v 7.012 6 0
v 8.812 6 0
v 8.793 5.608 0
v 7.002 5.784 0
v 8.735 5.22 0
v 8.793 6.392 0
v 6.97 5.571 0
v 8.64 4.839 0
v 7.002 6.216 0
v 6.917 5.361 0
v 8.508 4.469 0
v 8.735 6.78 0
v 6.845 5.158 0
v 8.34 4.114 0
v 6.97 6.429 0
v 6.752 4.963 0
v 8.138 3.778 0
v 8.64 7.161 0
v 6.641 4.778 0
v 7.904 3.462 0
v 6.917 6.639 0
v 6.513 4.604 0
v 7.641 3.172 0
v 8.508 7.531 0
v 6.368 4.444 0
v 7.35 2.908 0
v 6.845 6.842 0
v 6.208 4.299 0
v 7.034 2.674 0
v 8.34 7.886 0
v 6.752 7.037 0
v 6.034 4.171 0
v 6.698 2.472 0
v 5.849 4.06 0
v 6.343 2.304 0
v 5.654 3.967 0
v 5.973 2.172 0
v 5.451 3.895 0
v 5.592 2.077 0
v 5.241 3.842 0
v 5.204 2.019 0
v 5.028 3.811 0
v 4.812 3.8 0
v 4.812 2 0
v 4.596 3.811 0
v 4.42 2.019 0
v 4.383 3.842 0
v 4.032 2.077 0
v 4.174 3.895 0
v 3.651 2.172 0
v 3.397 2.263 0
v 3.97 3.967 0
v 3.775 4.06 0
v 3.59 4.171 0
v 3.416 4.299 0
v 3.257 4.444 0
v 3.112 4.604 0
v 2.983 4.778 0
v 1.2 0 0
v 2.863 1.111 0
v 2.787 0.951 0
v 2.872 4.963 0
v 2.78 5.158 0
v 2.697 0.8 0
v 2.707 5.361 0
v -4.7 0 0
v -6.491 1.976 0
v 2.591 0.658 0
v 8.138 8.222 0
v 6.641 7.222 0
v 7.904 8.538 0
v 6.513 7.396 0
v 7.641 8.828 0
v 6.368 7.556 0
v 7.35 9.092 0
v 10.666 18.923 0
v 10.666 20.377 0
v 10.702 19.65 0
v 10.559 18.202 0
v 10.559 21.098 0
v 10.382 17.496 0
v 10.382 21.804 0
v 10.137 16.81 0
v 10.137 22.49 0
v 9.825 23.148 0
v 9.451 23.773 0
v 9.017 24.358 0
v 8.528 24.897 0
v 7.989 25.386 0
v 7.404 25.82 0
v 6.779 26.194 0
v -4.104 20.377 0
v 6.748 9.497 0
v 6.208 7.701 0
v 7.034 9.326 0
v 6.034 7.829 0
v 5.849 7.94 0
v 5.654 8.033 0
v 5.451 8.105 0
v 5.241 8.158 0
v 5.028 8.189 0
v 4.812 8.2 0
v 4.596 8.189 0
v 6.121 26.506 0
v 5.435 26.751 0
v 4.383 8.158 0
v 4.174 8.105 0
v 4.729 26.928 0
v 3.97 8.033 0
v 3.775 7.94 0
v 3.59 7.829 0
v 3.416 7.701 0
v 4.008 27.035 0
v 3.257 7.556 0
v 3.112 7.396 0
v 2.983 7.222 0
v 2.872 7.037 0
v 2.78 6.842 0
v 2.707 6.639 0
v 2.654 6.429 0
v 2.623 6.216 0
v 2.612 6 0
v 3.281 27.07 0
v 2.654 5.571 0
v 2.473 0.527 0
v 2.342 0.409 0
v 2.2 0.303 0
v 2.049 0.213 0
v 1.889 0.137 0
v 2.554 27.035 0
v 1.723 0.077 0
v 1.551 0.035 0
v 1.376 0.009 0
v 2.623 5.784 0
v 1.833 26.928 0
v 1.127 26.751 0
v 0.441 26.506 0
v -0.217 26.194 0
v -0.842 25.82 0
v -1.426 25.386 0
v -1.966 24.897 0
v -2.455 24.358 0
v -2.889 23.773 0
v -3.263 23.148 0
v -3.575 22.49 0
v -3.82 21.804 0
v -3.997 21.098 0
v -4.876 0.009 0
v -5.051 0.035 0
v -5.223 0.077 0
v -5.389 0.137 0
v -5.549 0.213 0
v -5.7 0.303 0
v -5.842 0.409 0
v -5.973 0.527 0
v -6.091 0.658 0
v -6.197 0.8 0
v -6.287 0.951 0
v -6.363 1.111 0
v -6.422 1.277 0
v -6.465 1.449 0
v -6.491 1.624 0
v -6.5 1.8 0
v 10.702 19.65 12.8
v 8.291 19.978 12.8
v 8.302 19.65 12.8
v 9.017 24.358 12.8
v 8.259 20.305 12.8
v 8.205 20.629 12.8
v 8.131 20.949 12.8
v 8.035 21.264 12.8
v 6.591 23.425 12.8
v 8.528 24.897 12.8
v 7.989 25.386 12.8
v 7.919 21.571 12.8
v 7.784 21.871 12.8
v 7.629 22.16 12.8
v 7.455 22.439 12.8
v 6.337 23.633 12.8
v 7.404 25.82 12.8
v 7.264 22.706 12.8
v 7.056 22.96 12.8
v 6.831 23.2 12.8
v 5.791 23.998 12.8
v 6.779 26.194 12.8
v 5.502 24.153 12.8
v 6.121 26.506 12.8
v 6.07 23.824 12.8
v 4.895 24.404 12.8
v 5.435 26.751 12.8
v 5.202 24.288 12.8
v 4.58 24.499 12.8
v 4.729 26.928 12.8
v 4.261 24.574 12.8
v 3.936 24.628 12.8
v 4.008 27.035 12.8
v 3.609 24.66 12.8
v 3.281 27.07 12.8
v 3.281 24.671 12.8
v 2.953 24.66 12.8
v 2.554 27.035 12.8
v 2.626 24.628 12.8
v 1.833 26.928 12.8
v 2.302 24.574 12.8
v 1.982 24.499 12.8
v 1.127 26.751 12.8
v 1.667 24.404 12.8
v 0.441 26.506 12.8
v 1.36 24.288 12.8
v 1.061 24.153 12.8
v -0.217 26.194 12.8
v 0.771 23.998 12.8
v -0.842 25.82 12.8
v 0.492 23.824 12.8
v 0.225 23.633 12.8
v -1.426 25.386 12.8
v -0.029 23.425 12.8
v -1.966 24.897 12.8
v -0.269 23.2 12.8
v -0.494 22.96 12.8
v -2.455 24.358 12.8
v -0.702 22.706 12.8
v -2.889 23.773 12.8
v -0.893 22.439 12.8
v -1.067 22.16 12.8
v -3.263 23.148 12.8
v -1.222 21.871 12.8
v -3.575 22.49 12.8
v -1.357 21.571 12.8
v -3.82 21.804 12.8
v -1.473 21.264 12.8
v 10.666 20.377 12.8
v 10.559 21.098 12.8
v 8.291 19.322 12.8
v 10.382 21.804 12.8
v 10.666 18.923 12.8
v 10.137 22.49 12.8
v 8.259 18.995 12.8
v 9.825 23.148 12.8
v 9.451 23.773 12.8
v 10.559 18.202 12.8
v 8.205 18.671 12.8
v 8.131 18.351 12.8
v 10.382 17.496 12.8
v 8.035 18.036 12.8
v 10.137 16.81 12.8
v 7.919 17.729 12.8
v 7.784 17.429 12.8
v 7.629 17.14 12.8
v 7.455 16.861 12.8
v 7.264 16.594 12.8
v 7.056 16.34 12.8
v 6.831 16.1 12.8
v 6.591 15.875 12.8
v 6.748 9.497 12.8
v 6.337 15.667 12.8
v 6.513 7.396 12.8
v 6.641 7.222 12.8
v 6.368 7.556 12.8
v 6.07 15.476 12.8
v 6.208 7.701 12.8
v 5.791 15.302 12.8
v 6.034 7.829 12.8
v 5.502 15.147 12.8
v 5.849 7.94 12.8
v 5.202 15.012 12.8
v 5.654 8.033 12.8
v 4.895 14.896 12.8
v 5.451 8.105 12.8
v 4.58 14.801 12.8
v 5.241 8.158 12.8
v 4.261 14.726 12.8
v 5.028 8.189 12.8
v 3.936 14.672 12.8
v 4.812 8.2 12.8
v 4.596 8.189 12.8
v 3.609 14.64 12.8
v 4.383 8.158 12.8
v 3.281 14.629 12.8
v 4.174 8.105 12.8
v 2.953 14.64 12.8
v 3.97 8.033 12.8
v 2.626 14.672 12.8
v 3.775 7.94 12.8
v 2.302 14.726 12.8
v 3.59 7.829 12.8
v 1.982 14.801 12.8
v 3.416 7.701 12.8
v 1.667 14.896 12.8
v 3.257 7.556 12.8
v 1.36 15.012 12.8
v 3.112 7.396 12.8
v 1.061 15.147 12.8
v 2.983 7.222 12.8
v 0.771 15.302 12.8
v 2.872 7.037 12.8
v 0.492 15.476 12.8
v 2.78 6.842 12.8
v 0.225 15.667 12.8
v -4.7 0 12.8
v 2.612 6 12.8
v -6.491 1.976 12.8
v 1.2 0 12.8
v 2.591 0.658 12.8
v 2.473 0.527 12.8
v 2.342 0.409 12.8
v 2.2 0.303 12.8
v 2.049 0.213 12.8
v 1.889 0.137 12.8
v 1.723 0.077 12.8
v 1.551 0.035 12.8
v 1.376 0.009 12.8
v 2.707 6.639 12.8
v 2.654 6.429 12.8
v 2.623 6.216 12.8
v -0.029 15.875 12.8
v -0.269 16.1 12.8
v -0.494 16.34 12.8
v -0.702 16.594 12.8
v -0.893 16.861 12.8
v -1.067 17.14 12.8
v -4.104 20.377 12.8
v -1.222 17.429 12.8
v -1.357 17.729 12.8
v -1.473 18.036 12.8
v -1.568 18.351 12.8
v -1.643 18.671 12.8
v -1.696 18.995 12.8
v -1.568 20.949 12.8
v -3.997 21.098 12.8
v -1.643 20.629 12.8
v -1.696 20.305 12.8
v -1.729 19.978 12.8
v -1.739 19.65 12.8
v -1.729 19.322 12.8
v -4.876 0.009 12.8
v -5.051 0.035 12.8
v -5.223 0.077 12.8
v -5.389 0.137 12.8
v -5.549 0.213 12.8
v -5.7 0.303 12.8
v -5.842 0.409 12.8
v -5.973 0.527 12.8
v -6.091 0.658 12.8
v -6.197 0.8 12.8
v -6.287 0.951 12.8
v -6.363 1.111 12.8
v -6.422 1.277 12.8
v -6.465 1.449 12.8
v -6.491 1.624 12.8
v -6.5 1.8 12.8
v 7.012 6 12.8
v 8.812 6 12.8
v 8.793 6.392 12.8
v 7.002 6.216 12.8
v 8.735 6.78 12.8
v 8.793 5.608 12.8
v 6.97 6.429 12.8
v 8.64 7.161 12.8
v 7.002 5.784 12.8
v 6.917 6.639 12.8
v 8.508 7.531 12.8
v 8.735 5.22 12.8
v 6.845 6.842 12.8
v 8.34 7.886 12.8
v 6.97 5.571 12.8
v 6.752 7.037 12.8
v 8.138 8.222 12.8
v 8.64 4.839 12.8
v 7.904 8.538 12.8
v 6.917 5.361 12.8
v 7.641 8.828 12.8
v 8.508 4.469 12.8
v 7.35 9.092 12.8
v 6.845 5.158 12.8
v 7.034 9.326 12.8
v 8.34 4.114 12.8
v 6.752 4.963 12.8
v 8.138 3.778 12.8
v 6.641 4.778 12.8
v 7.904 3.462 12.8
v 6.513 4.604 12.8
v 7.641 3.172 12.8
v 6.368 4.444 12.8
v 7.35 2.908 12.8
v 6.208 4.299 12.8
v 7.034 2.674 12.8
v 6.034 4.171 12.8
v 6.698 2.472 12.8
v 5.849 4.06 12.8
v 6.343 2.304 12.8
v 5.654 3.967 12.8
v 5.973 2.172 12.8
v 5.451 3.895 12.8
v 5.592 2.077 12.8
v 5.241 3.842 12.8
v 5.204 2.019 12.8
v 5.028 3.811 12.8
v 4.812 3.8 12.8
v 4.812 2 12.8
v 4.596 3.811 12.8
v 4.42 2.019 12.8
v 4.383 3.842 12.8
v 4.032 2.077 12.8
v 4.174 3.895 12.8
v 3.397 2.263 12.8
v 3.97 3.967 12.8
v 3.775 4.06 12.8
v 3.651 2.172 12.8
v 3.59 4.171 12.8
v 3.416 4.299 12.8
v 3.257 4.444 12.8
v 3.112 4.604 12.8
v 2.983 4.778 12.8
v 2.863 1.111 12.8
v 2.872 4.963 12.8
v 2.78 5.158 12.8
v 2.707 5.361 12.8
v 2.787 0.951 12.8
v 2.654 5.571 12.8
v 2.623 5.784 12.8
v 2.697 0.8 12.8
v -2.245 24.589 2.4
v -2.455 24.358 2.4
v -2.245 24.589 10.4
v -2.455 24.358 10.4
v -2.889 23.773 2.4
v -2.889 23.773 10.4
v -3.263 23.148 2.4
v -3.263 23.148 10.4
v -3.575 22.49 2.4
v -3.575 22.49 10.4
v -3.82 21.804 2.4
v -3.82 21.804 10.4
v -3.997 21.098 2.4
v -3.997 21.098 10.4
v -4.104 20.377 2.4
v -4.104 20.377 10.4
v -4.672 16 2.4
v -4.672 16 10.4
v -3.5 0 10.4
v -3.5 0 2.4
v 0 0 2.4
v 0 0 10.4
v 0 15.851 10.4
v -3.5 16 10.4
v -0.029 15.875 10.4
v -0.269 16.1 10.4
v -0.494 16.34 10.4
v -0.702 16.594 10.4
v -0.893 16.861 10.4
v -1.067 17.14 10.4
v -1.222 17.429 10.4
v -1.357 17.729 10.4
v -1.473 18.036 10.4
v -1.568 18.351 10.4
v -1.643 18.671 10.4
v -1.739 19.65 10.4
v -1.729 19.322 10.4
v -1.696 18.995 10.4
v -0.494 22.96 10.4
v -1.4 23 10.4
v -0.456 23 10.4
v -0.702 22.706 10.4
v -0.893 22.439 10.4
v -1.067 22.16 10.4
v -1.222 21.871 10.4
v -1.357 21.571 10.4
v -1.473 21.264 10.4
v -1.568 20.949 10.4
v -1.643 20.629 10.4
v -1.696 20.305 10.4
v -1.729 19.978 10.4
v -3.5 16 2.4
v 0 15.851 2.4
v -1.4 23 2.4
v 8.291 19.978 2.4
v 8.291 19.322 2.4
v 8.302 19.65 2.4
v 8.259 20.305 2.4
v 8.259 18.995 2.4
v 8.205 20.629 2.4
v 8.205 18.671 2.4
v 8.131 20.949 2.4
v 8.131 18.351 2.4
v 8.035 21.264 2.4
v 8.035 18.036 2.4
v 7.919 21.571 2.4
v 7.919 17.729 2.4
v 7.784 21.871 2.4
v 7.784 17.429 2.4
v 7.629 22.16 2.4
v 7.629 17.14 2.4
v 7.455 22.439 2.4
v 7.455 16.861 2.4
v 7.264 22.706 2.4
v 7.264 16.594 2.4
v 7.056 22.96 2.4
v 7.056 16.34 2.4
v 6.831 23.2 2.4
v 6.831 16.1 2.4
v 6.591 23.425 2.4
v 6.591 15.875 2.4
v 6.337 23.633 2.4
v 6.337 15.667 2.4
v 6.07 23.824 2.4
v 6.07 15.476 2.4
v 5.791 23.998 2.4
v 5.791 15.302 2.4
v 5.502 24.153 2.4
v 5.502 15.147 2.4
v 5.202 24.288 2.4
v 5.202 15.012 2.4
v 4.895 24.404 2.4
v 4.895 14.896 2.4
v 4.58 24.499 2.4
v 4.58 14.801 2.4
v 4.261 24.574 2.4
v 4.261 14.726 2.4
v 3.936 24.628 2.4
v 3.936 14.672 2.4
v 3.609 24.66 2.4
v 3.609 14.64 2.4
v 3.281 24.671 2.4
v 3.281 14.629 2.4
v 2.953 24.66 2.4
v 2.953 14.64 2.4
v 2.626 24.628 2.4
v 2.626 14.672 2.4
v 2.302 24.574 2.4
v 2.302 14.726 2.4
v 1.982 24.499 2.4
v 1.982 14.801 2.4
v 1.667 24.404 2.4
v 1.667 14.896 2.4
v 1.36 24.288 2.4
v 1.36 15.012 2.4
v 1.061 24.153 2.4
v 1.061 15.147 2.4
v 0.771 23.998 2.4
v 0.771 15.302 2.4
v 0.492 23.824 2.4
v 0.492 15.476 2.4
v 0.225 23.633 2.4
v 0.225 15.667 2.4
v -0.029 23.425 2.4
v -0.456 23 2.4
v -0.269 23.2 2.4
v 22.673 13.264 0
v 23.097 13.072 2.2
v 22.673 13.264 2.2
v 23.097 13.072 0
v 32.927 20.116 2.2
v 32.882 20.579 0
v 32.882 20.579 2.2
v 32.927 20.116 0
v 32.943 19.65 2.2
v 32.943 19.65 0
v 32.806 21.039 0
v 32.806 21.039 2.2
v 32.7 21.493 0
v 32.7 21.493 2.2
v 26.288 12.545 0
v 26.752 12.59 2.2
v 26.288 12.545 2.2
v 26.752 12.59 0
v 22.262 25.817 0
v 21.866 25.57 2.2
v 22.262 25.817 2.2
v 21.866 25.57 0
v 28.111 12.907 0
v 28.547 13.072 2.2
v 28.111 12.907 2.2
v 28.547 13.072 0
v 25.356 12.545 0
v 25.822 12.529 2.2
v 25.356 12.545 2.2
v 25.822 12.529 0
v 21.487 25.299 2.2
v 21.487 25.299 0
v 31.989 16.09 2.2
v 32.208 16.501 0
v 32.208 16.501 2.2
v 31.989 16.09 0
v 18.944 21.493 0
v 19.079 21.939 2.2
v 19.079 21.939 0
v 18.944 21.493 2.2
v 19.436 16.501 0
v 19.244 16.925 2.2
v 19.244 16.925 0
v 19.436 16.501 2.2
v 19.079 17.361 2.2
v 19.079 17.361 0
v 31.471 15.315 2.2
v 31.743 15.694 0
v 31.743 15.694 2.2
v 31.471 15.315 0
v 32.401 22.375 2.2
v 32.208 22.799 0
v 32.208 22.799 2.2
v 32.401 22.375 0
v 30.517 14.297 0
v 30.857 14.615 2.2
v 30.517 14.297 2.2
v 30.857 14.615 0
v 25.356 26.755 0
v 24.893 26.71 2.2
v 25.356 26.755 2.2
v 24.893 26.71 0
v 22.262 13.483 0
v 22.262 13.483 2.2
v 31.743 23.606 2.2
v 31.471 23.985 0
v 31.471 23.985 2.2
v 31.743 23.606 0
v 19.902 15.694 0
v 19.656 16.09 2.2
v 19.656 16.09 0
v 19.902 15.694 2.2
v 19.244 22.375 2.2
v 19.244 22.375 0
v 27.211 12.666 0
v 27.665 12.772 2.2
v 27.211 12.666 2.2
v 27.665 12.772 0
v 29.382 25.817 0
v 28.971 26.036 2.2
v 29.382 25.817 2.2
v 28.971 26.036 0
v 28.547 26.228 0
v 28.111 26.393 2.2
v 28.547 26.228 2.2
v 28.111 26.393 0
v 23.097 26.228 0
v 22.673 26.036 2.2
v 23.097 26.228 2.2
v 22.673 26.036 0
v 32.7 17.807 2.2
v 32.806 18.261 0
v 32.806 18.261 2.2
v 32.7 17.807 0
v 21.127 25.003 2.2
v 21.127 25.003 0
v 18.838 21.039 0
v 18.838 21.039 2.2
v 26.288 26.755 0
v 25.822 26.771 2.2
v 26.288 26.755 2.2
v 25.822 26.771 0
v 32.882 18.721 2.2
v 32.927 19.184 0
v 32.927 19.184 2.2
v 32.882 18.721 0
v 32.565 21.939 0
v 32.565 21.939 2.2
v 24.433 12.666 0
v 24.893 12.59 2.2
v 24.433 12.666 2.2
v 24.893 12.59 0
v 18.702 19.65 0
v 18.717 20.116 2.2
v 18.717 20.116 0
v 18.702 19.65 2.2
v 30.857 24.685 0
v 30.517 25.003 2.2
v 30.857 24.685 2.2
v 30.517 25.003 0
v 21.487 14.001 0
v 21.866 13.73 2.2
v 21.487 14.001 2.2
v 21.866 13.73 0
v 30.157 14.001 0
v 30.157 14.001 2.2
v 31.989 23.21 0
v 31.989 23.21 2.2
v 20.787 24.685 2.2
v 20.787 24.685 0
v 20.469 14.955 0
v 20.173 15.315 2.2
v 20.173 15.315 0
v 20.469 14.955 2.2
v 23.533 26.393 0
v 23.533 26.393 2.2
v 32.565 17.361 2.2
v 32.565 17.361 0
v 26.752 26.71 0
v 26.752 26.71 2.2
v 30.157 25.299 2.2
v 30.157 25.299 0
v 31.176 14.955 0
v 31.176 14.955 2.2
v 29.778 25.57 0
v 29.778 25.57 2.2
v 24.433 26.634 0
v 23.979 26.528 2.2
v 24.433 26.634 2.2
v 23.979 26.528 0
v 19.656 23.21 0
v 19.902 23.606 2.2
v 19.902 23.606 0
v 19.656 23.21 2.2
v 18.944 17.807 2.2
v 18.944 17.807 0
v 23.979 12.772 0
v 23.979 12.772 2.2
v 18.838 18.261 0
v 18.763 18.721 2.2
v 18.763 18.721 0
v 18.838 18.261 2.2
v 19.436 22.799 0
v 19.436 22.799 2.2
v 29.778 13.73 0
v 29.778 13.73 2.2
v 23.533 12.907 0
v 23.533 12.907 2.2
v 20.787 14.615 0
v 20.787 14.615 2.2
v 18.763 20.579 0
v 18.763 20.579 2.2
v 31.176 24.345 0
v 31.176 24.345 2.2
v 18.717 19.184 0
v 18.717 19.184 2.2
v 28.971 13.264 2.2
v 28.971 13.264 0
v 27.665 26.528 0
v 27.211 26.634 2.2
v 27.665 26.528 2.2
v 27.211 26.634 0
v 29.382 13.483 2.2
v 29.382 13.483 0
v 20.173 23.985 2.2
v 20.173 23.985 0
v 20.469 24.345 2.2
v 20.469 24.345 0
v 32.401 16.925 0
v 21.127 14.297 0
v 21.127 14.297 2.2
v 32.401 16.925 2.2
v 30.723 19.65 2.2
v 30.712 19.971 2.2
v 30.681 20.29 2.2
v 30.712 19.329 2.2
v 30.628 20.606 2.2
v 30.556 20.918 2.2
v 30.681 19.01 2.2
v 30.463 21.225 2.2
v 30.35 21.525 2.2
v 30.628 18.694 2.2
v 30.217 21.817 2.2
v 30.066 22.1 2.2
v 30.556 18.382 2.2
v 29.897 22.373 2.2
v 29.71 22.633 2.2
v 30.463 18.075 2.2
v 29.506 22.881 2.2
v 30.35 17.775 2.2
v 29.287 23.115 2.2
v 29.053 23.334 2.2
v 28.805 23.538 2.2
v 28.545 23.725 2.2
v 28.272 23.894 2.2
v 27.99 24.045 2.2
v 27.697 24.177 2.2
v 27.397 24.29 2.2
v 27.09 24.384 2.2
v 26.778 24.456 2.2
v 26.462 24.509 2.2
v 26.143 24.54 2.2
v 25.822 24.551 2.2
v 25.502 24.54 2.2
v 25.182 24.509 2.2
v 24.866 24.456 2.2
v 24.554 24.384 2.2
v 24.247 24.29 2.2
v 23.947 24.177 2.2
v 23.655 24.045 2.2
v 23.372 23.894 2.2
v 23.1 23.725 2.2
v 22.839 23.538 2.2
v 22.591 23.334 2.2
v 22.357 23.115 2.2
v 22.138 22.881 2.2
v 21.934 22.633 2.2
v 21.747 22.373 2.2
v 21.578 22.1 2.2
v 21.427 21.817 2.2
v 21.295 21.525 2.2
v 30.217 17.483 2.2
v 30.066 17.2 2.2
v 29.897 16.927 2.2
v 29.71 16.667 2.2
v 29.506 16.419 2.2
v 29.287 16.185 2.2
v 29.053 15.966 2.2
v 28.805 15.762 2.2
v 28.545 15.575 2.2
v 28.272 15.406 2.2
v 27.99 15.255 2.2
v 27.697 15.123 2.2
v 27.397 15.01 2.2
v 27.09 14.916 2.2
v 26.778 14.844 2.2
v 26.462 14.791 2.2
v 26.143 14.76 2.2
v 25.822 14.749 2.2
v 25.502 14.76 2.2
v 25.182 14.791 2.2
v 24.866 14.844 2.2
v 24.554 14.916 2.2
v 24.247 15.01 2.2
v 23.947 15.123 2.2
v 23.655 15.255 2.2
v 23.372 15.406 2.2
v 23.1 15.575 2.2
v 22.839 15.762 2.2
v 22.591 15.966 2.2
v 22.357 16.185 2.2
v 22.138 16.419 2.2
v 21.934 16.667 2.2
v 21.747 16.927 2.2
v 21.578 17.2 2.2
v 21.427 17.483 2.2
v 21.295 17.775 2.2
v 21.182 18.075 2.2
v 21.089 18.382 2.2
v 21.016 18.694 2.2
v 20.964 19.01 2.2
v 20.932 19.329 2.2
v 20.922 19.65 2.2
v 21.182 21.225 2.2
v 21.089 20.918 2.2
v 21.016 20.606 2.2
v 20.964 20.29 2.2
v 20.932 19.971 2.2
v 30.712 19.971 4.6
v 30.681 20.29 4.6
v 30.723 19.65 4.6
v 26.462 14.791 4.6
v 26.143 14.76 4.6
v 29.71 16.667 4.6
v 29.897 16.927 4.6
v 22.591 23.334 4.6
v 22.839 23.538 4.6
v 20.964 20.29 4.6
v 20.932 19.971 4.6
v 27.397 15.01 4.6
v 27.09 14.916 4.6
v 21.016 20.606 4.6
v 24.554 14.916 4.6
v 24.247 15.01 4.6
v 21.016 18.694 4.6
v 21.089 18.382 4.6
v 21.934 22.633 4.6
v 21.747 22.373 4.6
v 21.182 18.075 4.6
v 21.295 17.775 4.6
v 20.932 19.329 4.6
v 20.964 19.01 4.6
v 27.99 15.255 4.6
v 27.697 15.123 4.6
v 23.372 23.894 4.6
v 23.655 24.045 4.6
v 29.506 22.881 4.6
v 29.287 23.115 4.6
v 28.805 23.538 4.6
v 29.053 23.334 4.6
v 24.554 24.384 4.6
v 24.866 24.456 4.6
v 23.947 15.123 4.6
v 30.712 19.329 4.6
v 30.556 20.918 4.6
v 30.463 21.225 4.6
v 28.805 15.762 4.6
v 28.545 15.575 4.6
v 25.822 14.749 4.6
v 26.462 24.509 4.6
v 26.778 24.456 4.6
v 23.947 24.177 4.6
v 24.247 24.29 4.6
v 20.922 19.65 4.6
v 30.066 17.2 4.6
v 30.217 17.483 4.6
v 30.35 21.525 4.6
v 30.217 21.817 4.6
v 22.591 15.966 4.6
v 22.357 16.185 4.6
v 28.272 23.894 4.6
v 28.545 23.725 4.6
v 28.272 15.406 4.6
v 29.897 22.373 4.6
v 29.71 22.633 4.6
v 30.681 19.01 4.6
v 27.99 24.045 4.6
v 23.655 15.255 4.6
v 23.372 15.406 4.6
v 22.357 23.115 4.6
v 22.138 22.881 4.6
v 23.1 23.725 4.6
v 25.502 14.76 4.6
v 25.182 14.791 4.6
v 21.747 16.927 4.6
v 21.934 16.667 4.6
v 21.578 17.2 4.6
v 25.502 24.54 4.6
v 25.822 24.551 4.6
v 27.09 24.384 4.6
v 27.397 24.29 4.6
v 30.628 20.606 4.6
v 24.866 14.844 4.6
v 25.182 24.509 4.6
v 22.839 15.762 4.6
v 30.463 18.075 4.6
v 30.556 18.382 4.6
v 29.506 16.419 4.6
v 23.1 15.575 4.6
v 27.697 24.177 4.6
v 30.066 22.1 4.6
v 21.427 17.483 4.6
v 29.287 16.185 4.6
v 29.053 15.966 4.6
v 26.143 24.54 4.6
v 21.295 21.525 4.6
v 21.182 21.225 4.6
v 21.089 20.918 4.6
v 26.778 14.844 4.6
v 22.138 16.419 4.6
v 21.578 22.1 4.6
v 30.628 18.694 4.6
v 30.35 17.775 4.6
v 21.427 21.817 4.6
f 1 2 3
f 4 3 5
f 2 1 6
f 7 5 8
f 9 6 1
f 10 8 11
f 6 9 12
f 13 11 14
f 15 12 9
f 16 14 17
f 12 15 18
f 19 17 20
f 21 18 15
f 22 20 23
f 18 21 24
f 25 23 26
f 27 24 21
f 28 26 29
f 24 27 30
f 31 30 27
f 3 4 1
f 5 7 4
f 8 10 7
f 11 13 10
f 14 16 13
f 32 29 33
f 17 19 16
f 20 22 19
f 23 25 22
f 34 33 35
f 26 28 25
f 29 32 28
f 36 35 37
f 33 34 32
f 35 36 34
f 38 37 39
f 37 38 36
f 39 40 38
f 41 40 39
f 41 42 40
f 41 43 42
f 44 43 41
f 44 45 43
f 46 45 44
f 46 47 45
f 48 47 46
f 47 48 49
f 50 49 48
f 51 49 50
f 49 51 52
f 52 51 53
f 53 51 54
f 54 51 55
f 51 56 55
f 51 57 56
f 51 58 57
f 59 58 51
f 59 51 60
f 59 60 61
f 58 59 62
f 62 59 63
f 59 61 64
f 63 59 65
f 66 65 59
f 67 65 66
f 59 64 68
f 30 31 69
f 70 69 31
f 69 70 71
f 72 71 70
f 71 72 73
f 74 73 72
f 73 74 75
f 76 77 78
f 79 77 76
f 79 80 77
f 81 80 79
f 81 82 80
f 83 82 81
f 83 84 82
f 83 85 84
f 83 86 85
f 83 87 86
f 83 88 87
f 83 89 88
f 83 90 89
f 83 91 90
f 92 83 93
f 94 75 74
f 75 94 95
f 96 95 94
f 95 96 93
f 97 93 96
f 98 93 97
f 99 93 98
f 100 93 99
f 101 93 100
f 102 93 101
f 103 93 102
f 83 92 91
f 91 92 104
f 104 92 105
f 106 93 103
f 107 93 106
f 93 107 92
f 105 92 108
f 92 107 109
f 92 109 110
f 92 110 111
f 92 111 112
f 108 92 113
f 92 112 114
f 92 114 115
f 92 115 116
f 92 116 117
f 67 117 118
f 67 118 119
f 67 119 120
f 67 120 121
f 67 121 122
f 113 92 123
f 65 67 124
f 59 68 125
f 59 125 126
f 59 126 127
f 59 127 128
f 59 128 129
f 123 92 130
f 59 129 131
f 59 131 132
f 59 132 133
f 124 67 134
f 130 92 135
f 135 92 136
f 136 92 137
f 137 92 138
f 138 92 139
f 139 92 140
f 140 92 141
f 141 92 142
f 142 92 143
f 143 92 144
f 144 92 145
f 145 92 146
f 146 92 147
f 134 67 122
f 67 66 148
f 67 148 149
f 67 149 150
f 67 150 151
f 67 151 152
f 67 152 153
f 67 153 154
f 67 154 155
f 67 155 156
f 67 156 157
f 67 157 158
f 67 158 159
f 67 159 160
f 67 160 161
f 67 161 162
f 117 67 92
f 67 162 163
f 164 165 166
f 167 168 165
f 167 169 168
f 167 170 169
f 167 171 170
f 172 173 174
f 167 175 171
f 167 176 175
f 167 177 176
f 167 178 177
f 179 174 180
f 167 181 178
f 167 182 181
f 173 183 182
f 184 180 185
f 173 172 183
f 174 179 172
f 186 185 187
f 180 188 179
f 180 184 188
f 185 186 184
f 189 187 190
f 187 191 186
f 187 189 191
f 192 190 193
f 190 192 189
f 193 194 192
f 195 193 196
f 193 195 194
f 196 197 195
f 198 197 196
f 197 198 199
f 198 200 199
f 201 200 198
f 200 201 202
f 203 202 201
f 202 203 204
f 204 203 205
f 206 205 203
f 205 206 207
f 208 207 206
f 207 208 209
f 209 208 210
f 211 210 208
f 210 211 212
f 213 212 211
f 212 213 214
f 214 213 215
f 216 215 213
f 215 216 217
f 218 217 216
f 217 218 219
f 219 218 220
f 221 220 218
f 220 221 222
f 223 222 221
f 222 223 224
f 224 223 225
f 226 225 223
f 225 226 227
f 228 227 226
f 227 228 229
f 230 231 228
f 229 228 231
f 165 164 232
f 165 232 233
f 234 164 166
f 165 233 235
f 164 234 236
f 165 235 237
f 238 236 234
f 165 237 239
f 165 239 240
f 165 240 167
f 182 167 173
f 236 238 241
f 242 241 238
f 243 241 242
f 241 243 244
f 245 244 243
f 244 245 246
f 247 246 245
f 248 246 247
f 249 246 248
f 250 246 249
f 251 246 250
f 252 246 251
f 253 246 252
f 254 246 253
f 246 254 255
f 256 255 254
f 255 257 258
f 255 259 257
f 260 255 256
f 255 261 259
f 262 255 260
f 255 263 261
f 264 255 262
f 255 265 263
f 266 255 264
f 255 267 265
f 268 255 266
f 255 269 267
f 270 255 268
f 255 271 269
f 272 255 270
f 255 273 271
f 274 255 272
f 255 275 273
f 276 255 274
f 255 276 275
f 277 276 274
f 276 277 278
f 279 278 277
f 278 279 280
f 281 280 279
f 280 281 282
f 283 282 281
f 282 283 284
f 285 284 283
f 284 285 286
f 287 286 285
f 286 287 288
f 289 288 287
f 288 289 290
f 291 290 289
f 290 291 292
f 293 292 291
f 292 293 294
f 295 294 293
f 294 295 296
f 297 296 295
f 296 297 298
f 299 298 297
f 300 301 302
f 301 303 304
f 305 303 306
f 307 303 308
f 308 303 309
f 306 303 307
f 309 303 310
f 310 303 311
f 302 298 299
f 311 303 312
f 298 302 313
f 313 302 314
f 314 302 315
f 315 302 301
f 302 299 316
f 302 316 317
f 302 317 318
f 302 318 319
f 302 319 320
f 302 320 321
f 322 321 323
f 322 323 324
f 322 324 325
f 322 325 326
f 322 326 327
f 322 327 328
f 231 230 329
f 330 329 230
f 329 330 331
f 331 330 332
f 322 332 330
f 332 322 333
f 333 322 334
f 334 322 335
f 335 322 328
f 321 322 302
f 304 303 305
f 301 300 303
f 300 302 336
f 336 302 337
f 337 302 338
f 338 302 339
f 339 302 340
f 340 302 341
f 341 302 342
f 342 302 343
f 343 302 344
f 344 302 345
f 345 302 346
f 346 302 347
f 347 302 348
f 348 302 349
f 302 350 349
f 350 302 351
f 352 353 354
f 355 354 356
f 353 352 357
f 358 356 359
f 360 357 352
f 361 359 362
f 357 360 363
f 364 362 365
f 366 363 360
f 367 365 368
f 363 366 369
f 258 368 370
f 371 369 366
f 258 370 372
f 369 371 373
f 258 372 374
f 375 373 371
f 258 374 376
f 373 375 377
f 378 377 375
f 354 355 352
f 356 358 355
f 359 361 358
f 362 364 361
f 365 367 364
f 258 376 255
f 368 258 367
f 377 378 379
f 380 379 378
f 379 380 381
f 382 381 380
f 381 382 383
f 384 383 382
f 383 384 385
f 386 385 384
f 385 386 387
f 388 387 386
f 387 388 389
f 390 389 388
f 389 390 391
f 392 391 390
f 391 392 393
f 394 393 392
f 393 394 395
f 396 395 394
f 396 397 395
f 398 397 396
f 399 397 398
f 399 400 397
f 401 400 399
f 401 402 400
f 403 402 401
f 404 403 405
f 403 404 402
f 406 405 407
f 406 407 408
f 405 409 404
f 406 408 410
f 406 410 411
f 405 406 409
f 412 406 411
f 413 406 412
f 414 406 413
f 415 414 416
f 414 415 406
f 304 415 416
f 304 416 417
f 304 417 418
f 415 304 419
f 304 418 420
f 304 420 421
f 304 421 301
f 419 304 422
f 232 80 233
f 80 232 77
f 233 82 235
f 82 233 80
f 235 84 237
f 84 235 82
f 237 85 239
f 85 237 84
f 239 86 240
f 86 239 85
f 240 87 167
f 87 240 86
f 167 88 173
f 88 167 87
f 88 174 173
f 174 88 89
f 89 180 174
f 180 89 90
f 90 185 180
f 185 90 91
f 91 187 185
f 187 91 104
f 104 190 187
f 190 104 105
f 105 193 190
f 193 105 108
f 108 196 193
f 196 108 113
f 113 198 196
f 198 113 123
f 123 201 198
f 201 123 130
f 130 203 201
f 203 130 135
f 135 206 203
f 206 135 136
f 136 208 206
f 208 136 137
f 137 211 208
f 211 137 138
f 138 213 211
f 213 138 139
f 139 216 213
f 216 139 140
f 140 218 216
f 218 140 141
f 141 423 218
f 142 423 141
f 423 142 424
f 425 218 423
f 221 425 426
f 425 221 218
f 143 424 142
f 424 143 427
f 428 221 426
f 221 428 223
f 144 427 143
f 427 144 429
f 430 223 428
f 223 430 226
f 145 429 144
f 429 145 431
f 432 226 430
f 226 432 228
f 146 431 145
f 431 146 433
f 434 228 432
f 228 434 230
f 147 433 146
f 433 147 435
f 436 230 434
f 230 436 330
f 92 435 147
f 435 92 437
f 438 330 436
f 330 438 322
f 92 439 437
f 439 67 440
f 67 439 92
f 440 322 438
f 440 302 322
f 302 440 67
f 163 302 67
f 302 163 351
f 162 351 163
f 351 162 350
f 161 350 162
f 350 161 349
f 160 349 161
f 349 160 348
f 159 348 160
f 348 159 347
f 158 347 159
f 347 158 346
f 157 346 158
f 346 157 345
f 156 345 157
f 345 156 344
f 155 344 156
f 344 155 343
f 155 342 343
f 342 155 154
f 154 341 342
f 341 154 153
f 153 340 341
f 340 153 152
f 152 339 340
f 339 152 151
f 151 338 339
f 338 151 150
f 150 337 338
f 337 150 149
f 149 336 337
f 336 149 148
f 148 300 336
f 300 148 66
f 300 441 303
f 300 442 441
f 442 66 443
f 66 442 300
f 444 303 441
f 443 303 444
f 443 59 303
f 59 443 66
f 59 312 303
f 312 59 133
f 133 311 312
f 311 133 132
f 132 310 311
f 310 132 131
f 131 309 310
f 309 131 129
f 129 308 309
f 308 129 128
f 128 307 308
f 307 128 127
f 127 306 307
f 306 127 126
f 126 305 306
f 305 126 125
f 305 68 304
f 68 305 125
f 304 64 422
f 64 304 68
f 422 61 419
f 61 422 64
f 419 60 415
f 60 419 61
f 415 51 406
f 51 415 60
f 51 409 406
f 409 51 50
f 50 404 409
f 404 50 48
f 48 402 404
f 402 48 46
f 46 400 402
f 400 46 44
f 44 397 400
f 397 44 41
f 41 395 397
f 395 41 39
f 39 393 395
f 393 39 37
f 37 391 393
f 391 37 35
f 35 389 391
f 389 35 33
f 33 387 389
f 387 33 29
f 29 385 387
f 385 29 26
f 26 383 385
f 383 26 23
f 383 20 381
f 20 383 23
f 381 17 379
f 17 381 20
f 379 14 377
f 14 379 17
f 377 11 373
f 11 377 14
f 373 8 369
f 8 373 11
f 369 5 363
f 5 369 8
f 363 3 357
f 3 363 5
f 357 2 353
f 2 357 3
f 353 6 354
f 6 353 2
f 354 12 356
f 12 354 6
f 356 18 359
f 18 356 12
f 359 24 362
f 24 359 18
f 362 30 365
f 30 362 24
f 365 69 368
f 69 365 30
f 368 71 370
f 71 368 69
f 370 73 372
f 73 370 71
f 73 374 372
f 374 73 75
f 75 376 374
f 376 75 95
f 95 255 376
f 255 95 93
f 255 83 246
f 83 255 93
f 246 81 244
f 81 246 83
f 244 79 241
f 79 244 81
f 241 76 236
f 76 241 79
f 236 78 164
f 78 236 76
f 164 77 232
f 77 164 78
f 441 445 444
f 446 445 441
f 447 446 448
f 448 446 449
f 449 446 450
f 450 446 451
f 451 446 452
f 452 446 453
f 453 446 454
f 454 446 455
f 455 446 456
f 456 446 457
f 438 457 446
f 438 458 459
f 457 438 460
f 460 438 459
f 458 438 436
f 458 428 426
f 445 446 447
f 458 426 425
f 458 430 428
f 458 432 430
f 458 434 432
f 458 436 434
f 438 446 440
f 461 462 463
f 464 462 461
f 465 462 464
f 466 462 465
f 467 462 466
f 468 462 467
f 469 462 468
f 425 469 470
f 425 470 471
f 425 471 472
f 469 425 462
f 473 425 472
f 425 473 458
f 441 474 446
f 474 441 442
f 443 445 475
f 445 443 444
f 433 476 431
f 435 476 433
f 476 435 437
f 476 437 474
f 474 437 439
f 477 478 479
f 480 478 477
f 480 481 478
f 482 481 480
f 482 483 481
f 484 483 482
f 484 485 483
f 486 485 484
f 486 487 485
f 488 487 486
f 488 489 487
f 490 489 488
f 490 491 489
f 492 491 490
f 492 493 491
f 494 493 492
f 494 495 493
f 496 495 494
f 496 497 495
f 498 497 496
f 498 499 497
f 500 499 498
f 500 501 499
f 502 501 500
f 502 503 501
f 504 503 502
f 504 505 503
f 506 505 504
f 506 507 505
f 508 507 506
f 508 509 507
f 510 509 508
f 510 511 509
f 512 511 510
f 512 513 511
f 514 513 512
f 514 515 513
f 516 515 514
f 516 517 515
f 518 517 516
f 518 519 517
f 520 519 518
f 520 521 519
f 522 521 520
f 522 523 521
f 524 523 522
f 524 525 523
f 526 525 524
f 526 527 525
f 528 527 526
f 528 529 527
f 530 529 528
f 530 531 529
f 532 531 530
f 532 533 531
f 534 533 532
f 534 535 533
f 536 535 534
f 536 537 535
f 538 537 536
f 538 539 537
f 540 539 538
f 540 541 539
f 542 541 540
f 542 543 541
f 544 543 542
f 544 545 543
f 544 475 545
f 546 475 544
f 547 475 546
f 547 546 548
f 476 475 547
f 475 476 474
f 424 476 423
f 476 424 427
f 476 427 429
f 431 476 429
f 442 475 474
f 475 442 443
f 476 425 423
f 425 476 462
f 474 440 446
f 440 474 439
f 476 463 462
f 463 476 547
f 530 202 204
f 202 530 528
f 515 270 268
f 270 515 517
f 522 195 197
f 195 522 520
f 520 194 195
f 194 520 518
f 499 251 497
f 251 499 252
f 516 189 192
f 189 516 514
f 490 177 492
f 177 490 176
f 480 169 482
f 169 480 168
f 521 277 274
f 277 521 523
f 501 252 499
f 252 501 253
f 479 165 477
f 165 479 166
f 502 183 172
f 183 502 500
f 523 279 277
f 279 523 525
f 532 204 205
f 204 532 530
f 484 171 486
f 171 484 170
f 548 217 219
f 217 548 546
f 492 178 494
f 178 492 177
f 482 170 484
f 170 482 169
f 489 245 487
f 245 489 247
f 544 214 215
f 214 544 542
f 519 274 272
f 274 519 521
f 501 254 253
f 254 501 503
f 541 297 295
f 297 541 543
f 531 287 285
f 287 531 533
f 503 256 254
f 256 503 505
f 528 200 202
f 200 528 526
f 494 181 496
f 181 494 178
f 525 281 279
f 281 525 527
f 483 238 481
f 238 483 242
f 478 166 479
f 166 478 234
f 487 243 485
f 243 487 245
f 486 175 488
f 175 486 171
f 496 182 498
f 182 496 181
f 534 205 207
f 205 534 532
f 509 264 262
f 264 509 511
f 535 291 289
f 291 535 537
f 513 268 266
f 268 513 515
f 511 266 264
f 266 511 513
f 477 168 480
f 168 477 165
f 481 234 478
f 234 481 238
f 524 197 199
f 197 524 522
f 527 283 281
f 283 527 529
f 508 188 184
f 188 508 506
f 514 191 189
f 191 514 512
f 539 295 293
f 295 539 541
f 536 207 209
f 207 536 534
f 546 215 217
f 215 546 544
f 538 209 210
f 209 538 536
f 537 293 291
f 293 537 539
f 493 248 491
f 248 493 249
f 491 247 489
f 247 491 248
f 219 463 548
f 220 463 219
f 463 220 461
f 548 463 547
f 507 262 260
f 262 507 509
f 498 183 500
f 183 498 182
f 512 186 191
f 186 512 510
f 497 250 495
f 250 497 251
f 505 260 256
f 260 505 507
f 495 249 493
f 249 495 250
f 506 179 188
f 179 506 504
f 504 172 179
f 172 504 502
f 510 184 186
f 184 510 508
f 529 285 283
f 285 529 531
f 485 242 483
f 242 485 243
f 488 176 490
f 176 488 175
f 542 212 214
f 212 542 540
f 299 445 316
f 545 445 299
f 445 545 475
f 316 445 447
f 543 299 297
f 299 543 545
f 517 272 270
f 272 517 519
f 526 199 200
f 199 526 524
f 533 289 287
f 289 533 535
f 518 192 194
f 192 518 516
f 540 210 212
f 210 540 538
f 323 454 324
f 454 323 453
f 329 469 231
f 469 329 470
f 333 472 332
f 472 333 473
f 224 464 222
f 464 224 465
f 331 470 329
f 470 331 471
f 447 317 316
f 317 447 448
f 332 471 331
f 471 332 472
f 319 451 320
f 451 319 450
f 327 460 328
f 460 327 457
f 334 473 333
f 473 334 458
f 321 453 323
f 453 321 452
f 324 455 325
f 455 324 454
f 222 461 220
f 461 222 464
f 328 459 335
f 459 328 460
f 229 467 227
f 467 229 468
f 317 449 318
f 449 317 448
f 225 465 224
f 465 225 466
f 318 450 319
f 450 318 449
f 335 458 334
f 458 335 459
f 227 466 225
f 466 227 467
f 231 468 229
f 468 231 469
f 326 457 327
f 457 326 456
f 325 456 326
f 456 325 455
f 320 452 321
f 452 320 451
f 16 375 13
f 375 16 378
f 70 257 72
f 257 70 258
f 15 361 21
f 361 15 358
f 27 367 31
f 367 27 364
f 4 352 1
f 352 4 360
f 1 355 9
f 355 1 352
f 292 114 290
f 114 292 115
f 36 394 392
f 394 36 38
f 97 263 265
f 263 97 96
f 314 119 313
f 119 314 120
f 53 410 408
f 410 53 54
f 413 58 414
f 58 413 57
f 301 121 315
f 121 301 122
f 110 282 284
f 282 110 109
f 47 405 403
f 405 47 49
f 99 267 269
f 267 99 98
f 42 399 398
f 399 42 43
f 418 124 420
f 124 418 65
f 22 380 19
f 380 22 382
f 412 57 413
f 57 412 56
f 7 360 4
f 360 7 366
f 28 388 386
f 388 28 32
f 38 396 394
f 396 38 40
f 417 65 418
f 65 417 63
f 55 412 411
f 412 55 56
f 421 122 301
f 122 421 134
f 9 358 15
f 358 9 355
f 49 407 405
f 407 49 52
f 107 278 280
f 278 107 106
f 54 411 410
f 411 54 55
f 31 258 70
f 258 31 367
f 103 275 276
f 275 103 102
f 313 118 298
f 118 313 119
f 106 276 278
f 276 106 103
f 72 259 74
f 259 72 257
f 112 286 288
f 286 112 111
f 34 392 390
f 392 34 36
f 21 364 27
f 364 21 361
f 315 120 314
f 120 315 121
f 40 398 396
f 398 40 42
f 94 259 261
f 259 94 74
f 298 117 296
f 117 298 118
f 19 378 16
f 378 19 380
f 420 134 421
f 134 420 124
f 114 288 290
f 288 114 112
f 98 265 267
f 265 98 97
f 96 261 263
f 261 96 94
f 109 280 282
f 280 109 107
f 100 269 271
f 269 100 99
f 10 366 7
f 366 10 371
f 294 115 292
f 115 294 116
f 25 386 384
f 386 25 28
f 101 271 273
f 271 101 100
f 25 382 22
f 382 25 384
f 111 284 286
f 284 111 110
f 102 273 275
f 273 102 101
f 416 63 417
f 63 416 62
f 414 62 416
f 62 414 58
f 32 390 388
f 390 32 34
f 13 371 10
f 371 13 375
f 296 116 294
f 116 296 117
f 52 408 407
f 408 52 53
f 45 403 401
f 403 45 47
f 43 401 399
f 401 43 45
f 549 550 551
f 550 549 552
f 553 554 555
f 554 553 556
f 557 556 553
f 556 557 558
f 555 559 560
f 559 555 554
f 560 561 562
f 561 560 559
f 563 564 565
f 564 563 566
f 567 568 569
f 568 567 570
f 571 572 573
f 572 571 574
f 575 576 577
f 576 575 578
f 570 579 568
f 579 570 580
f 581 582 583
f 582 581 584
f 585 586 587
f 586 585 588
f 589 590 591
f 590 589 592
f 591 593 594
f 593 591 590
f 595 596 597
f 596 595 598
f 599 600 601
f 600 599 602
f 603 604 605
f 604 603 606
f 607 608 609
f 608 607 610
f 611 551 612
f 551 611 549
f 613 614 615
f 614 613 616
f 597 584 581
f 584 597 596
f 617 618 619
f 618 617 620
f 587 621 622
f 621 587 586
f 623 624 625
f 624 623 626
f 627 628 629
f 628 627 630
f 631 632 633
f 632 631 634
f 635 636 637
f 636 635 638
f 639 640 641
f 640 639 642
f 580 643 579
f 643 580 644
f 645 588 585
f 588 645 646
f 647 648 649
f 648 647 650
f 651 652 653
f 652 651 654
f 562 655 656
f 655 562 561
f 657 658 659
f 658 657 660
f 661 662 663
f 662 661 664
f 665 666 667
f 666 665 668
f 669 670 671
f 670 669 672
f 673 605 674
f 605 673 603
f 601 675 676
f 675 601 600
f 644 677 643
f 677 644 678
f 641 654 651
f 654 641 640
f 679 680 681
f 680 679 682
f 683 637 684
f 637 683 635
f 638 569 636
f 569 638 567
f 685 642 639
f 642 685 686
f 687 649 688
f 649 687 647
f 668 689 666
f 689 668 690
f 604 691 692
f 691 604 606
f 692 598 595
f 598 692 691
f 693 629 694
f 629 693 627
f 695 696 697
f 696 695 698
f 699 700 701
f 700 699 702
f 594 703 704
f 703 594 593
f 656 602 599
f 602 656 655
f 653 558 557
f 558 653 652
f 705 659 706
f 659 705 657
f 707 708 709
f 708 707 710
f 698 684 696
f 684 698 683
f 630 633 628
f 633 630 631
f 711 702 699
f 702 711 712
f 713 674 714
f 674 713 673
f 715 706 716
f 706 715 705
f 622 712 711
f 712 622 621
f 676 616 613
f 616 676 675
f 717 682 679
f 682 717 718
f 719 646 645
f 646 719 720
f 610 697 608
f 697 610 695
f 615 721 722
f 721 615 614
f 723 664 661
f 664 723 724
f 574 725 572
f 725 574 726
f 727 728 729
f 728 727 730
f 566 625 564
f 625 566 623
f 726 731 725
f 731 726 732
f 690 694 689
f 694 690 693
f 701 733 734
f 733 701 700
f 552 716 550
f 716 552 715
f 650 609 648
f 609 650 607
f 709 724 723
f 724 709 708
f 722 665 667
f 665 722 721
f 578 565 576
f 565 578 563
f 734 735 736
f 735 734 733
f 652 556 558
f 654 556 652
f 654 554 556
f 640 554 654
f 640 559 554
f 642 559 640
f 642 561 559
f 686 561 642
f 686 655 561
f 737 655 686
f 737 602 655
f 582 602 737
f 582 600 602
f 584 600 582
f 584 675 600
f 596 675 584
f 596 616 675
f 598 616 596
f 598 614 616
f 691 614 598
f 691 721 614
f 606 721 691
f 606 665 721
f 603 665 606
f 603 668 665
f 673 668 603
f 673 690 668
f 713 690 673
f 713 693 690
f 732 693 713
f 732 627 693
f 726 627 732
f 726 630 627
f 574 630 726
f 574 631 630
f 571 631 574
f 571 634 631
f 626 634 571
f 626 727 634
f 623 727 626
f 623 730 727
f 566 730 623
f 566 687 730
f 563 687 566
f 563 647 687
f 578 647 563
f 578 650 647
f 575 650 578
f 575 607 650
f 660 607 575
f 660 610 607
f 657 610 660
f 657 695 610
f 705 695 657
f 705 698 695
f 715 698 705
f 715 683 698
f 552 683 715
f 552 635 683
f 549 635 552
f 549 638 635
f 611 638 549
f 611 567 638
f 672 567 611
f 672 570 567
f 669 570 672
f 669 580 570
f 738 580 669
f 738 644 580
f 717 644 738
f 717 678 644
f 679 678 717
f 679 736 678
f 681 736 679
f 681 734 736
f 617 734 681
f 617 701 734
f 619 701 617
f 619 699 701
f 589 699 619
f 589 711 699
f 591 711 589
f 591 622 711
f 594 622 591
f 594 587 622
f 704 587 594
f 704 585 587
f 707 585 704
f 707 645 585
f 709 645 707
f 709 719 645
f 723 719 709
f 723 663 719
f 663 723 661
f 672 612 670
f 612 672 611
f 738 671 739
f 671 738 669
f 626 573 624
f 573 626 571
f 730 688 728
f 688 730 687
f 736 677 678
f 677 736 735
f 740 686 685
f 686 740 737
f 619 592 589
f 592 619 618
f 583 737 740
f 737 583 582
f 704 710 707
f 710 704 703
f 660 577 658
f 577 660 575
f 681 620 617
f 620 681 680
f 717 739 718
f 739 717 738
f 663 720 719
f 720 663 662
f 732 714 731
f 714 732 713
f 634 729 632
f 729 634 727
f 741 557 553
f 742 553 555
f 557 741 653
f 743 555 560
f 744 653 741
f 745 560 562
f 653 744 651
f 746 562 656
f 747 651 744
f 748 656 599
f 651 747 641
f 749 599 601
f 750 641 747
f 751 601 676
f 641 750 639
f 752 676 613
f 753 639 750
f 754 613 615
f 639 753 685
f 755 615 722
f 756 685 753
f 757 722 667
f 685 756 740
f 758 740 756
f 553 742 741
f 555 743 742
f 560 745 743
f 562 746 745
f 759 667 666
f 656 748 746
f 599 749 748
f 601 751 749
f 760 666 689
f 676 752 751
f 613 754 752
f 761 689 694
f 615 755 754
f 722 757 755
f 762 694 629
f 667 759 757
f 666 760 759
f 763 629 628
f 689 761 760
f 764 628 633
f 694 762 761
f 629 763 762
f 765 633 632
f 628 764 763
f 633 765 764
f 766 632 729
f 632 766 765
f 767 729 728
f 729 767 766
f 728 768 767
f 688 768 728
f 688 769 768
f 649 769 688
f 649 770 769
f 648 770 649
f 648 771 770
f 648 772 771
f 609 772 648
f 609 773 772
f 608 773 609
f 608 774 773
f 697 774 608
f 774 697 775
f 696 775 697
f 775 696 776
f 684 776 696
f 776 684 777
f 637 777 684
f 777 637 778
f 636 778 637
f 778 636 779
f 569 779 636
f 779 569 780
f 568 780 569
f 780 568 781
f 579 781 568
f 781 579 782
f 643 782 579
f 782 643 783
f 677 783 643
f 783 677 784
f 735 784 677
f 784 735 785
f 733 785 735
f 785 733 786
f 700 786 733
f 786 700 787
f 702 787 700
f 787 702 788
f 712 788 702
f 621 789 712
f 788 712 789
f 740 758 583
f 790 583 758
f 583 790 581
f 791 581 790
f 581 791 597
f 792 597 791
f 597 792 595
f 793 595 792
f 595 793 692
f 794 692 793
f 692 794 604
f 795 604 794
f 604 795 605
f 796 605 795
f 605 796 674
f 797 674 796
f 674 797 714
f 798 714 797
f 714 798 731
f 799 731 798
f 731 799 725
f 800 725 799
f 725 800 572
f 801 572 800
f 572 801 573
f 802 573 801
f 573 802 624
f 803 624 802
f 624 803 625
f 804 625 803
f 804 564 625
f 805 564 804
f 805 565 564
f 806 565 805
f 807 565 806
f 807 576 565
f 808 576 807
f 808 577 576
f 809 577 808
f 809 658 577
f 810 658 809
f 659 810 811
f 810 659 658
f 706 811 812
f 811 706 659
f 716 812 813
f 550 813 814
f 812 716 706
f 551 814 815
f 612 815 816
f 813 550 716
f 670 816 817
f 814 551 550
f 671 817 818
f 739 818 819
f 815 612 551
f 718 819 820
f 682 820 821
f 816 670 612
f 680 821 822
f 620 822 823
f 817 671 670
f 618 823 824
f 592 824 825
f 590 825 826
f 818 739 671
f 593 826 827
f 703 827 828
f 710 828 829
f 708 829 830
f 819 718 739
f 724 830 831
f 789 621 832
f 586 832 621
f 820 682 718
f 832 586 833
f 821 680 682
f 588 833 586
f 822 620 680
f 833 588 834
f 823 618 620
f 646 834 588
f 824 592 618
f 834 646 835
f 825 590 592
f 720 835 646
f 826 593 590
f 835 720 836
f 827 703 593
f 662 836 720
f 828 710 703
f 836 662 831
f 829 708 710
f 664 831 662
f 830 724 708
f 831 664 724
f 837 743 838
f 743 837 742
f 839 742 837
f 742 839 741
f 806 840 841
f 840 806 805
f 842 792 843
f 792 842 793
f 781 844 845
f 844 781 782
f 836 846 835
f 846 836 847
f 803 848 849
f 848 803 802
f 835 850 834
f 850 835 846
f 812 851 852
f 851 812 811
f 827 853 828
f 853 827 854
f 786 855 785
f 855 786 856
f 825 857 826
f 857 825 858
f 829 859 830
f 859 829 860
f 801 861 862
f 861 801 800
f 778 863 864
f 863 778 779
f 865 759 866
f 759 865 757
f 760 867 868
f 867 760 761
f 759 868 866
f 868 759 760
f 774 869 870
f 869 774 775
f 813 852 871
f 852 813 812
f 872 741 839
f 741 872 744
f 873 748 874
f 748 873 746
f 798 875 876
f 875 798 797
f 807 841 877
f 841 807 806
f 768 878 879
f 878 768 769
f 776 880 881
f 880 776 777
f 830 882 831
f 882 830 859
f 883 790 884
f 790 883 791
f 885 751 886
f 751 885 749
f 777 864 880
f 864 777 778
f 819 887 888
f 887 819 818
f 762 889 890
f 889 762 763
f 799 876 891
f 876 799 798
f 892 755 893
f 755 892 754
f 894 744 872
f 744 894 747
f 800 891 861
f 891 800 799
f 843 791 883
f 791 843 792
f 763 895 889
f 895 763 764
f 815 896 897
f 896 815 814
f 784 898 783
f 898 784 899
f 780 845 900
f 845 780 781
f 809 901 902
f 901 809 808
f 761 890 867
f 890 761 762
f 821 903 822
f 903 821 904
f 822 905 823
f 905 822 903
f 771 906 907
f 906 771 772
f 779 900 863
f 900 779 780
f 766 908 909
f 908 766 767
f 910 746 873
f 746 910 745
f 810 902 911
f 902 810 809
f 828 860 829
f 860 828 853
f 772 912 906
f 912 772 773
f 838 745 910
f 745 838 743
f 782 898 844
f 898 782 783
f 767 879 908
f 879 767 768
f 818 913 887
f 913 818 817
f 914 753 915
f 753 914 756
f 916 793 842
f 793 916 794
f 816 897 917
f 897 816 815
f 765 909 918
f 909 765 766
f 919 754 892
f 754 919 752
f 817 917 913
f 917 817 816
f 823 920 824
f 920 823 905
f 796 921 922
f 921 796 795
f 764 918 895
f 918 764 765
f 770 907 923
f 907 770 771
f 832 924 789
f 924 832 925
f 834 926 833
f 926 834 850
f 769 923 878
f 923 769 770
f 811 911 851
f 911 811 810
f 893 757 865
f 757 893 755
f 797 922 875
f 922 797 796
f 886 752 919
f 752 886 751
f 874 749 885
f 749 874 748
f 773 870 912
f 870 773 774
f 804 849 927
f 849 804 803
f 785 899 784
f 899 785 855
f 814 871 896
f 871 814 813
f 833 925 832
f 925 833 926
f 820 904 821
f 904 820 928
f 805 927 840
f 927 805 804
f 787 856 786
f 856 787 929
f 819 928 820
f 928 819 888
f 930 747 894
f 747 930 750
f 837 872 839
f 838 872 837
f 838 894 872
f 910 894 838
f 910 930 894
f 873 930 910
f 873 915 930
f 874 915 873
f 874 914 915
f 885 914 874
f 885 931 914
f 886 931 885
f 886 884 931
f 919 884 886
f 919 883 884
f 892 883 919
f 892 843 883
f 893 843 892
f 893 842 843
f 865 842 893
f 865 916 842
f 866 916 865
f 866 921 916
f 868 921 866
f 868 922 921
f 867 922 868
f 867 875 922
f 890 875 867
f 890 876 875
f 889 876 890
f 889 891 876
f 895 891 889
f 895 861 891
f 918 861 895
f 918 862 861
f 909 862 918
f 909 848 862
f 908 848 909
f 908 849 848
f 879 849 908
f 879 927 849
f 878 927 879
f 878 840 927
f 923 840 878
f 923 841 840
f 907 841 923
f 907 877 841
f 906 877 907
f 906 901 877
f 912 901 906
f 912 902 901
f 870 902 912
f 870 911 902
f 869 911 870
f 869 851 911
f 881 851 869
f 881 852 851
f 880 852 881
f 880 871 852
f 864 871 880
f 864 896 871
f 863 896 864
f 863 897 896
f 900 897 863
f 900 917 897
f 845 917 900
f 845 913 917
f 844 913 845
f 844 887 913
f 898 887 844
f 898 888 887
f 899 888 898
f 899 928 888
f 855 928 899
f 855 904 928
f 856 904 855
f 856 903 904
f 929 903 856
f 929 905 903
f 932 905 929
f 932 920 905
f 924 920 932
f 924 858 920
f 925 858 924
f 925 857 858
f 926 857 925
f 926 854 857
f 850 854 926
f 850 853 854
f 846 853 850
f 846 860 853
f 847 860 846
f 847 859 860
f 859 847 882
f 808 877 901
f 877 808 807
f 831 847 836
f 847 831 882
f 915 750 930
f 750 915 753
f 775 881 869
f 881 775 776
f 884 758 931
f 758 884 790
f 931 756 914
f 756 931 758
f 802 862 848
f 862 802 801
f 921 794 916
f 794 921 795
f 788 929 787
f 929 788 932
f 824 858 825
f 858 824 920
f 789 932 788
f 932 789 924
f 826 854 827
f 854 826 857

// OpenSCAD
// @name Helmholtz Whistle
// @description Pea-less referee-style whistle whose chamber is sized from the Helmholtz equation to hit a target frequency (default 2500 Hz). Two pieces: body plus glue-in side cap, with a lanyard ring.
// @tags whistle, acoustics, helmholtz, referee, parametric, two-piece
//
// PHYSICS - Helmholtz resonator:
//
//     f = (c / 2*pi) * sqrt( A / (V * Leff) )
//
//   c    = speed of sound, 343 m/s (343000 mm/s) at 20 C
//   A    = duct exit area = duct_w * duct_h                     [mm^2]
//   Leff = duct_len + 1.7 * r_eq   (flanged-end correction),
//          r_eq = sqrt(A/pi) = equivalent duct radius           [mm]
//   V    = resonant chamber volume                              [mm^3]
//
// This file INVERTS the formula to size the chamber from the target
// frequency:  V = c^2 * A / (4*pi^2 * f^2 * Leff).  The chamber is a
// cylinder lying ACROSS the body (axis = X), interior width equal to
// duct_w, so its diameter is  D = 2 * sqrt( V / (pi * duct_w) ).
//
// Defaults:  A = 28 mm^2, r_eq = 2.985 mm, Leff = 21.075 mm
//            -> V = 633.5 mm^3 -> chamber D = 10.04 mm -> f = 2500 Hz.
// The formula is a lumped-element model; the real note also depends on
// blowing pressure and the jet/labium interaction (expect a few percent).
//
// GEOMETRY (referee-whistle cross-section, all in the YZ plane):
//   - Mouthpiece duct: rectangular windway, floor at z=0, from the mouth
//     face (y=0) to the window (y=duct_len).
//   - Window + labium: an opening in the top from the duct exit to a
//     SHARP wedge edge (the labium) at height labium_h (~0.4*duct_h),
//     which splits the air jet.  The wedge top rises at labium_angle.
//   - Chamber: transverse cylinder tangent-crossing the duct floor plane
//     so the window opens straight into it (the "mouth" of the resonator).
//
// TWO PIECES - why: the chamber is a closed transverse cylinder.  Printed
// in one piece it would need either internal supports (impossible to
// remove, wrecks the resonance) or a long flat bridge across the chamber
// ceiling (saggy, leaky).  Instead the body prints lying on its side, so
// every cavity wall is vertical and support-free, and the chamber's open
// side is sealed by a flat cap: plug depth = wall thickness, so the plug
// face sits exactly flush with the interior wall and the chamber volume
// is preserved.  Glue the cap on (the 0.12 mm radial glue gap adds
// ~1.8% of V while the glue cures - within the model's accuracy).
//
// PRINT: no supports.  "all" mode is the print layout - body on its
// side, cap flange-down.  0.2 mm layers, 100% infill recommended (a
// stiff shell gives a cleaner tone).
//
// ASSEMBLY: drop of CA glue around the cap plug, press flush, wipe.
// Thread a lanyard through the ring under the mouthpiece.
//
// Modes: "all" = print layout (2 bodies); "body" / "cap" = single
// pieces; "cutaway" = body halved lengthwise, upright, showing the
// duct, window, labium wedge and chamber.

/* [Acoustics] */
// Target fundamental frequency (Hz)
target_hz = 2500; // [1800:100:3200]
// Speed of sound (m/s) - 343 at 20 C
speed_of_sound = 343; // [330:1:355]

/* [Duct] */
// Duct (windway) width across the whistle; also the chamber interior width (mm)
duct_w = 8; // [6:0.5:10]
// Duct height (mm)
duct_h = 3.5; // [2.5:0.25:4.5]
// Duct length, mouth face to window (mm)
duct_len = 16; // [12:1:22]

/* [Fipple] */
// Window length, duct exit to labium edge (mm)
win_len = 7; // [5:0.5:9]
// Labium edge height above the duct floor (mm) - ~40% of duct height
labium_h = 1.4; // [0.8:0.1:2.2]
// Labium wedge angle above horizontal (degrees)
labium_angle = 28; // [20:1:35]

/* [Build] */
// Wall thickness (mm)
wall = 2.4; // [2:0.2:3.2]
// Radial glue clearance, cap plug to chamber bore (mm)
cap_clearance = 0.12; // [0.05:0.01:0.25]

/* [Display] */
// What to show
_display_mode = "all"; // ["all", "body", "cap", "cutaway"]

/* [Advanced] */
// Resolution
$fn = 64;
// Chamber / cap facets (higher = truer chamber volume)
_fn_chamber = 96;

// ---- Helmholtz sizing (mm units; c in mm/s) --------------------------
_c = speed_of_sound * 1000;              // mm/s
_A = duct_w * duct_h;                    // duct exit area, mm^2
_r_eq = sqrt(_A / PI);                   // equivalent duct radius, mm
_Leff = duct_len + 1.7 * _r_eq;          // neck + end correction, mm
// Invert f = (c/2pi)*sqrt(A/(V*Leff))  ->  chamber volume, mm^3
_V_req = _c * _c * _A / (4 * PI * PI * target_hz * target_hz * _Leff);
// Chamber: cylinder along X, interior width duct_w -> diameter
_r_ch = sqrt(_V_req / (PI * duct_w));    // chamber interior radius
_f_check = _c / (2 * PI) * sqrt(_A / (_V_req * _Leff));

echo(str("Helmholtz sizing: A=", _A, " mm^2  r_eq=", _r_eq,
    " mm  Leff=", _Leff, " mm  V=", _V_req, " mm^3  chamber D=",
    2 * _r_ch, " mm  -> predicted f=", _f_check, " Hz"));
assert(abs(_f_check - target_hz) < 0.01 * target_hz,
    "internal error: inverted Helmholtz formula does not round-trip");

// ---- Derived geometry ------------------------------------------------
_w_in = duct_w;                          // interior width (X)
_w_out = _w_in + 2 * wall;               // exterior width (X)
_mouth_t = 3;                            // outer shell above/below duct at mouth
_r_m = 1.8;                              // mouthpiece profile corner radius
_y_edge = duct_len + win_len;            // labium edge Y
// Chamber crosses the duct-floor plane (z=0) so the window opens into it.
// Half-chord of that crossing = win_len/2 + 0.3 so both window-cutter
// bottom corners land strictly INSIDE the cavity (no tangent contacts).
_hc = win_len / 2 + 0.3;
assert(_r_ch > _hc + 0.15, str("Chamber radius ", _r_ch,
    " mm is too small for a ", win_len,
    " mm window: shorten win_len, enlarge the duct, or lower target_hz"));
_y_c = duct_len + win_len / 2 + 0.15;    // chamber center Y
_z_c = -sqrt(_r_ch * _r_ch - _hc * _hc); // chamber center Z (below floor)
_r_out = _r_ch + wall;                   // chamber outer radius
_z_sky = duct_h + _mouth_t + _r_ch + 10; // safely above any body surface
_lab_run = (_z_sky - labium_h) / tan(labium_angle);

// Lanyard ring: centered on the chord between the mouthpiece bottom
// point and the chamber bottom point (both on the body, so the chord is
// inside the convex hull => the ring is always welded to the body).
// The ring slides forward (toward the mouth) until its hole clears the
// chamber cavity by >= 1.2 mm of wall.
_ring_r = 4;
_ring_hole_r = 2.2;
_zb_mouth = -_mouth_t;                   // mouth-bottom point (y=_r_m)
_zb_ch = _z_c - _r_out;                  // chamber bottom point (y=_y_c)
function _ring_z_at(y) =
    _zb_mouth + (y - _r_m) / (_y_c - _r_m) * (_zb_ch - _zb_mouth);
function _ring_ok(y) =
    norm([_y_c - y, _z_c - _ring_z_at(y)]) >= _r_ch + _ring_hole_r + 1.2;
function _find_ring_y(y) = y < _ring_r ? -1
    : _ring_ok(y) ? y : _find_ring_y(y - 0.25);
_y_r = _find_ring_y(6);
assert(_y_r > 0,
    "No room for the lanyard ring in front of the chamber - lower target_hz or lengthen duct_len");
_z_r = _ring_z_at(_y_r);
assert(_z_r + _ring_hole_r <= -1.2, str("Lanyard hole (top at ",
    _z_r + _ring_hole_r, " mm) leaves <1.2 mm under the duct floor - ",
    "lower target_hz or shrink the duct"));

// Cap: plug fills the wall opening flush with the chamber interior wall
_flange_r = _r_ch + wall - 0.3;          // always inside the side face
_flange_t = 2.2;
_plug_r = _r_ch - cap_clearance;

// Body extents (for print placement / cutaway)
_z_top = max(duct_h + _mouth_t, _z_c + _r_out);
_z_lo = min(_zb_ch, _z_r - _ring_r);

// ---- Body ------------------------------------------------------------

// 2D outline in the (y,z) plane
module _body_profile() {
    hull() {
        translate([_r_m, duct_h + _mouth_t - _r_m]) circle(r = _r_m);
        translate([_r_m, -_mouth_t + _r_m]) circle(r = _r_m);
        translate([_y_c, _z_c]) circle(r = _r_out);
    }
    translate([_y_r, _z_r]) circle(r = _ring_r);
}

// Solid body before any cavity is cut (public: used by the volume harness)
module body_envelope() {
    translate([-_w_out / 2, 0, 0])
        rotate([90, 0, 90])                 // 2D x->Y, 2D y->Z, extrude->X
            linear_extrude(height = _w_out) _body_profile();
}

// The resonant chamber cavity, exactly as subtracted from the body
// (public: the harness intersects this with body_envelope() and measures
// the mesh volume to verify the Helmholtz sizing).
module chamber_cavity() {
    translate([-_w_in / 2, _y_c, _z_c])
        rotate([0, 90, 0])
            cylinder(h = _w_in, r = _r_ch, $fn = _fn_chamber);
}

// Rectangular windway; floor at z=0. Overshoots the mouth face and pokes
// 0.3 mm past the window start so the two cutters overlap in volume.
module _duct_cutter() {
    translate([-_w_in / 2, -1, 0])
        cube([_w_in, duct_len + 1.3, duct_h]);
}

// Window opening + labium wedge: vertical face under the sharp edge at
// (_y_edge, labium_h), then the wedge top rising at labium_angle.
module _window_cutter() {
    translate([-_w_in / 2, 0, 0])
        rotate([90, 0, 90])
            linear_extrude(height = _w_in)
                polygon([[duct_len, 0], [_y_edge, 0], [_y_edge, labium_h],
                         [_y_edge + _lab_run, _z_sky], [duct_len, _z_sky]]);
}

// Side opening for the cap plug (same bore as the chamber, coaxial)
module _cap_bore() {
    translate([_w_in / 2 - 0.1, _y_c, _z_c])
        rotate([0, 90, 0])
            cylinder(h = wall + 1, r = _r_ch, $fn = _fn_chamber);
}

module _ring_hole() {
    translate([-_w_out / 2 - 0.5, _y_r, _z_r])
        rotate([0, 90, 0])
            cylinder(h = _w_out + 1, r = _ring_hole_r);
}

module whistle_body() {
    difference() {
        body_envelope();
        _duct_cutter();
        _window_cutter();
        chamber_cavity();
        _cap_bore();
        _ring_hole();
    }
}

// Print pose: lying on its flat -X side face, every cavity wall vertical
module body_print() {
    translate([0, 0, _w_out / 2]) rotate([0, -90, 0]) whistle_body();
}

// ---- Cap (modeled in print pose: flange down on the plate) ------------
module whistle_cap() {
    cylinder(h = _flange_t, r = _flange_r, $fn = _fn_chamber);
    translate([0, 0, _flange_t - 0.1])
        cylinder(h = wall + 0.1, r = _plug_r, $fn = _fn_chamber);
}

// Cap in its glued position on the +X face (public: fit-test harness)
module cap_assembled() {
    translate([_w_out / 2 + _flange_t, _y_c, _z_c])
        rotate([0, -90, 0]) whistle_cap();
}

// ---- Display ----------------------------------------------------------
if (_display_mode == "all") {
    color("Gold") body_print();
    color("OrangeRed")
        translate([-_z_lo + _flange_r + 8, _y_c, 0]) whistle_cap();
} else if (_display_mode == "body") {
    color("Gold") body_print();
} else if (_display_mode == "cap") {
    color("OrangeRed") whistle_cap();
} else if (_display_mode == "cutaway") {
    // Halved on the mid-plane, stood upright: duct, window, labium
    // wedge and chamber all visible in section.
    color("Gold") translate([0, 0, -_z_lo])
        difference() {
            whistle_body();
            translate([0, -5, _z_lo - 5])
                cube([_w_out, _y_edge + _lab_run + 10,
                      _z_top - _z_lo + 20]);
        }
}
